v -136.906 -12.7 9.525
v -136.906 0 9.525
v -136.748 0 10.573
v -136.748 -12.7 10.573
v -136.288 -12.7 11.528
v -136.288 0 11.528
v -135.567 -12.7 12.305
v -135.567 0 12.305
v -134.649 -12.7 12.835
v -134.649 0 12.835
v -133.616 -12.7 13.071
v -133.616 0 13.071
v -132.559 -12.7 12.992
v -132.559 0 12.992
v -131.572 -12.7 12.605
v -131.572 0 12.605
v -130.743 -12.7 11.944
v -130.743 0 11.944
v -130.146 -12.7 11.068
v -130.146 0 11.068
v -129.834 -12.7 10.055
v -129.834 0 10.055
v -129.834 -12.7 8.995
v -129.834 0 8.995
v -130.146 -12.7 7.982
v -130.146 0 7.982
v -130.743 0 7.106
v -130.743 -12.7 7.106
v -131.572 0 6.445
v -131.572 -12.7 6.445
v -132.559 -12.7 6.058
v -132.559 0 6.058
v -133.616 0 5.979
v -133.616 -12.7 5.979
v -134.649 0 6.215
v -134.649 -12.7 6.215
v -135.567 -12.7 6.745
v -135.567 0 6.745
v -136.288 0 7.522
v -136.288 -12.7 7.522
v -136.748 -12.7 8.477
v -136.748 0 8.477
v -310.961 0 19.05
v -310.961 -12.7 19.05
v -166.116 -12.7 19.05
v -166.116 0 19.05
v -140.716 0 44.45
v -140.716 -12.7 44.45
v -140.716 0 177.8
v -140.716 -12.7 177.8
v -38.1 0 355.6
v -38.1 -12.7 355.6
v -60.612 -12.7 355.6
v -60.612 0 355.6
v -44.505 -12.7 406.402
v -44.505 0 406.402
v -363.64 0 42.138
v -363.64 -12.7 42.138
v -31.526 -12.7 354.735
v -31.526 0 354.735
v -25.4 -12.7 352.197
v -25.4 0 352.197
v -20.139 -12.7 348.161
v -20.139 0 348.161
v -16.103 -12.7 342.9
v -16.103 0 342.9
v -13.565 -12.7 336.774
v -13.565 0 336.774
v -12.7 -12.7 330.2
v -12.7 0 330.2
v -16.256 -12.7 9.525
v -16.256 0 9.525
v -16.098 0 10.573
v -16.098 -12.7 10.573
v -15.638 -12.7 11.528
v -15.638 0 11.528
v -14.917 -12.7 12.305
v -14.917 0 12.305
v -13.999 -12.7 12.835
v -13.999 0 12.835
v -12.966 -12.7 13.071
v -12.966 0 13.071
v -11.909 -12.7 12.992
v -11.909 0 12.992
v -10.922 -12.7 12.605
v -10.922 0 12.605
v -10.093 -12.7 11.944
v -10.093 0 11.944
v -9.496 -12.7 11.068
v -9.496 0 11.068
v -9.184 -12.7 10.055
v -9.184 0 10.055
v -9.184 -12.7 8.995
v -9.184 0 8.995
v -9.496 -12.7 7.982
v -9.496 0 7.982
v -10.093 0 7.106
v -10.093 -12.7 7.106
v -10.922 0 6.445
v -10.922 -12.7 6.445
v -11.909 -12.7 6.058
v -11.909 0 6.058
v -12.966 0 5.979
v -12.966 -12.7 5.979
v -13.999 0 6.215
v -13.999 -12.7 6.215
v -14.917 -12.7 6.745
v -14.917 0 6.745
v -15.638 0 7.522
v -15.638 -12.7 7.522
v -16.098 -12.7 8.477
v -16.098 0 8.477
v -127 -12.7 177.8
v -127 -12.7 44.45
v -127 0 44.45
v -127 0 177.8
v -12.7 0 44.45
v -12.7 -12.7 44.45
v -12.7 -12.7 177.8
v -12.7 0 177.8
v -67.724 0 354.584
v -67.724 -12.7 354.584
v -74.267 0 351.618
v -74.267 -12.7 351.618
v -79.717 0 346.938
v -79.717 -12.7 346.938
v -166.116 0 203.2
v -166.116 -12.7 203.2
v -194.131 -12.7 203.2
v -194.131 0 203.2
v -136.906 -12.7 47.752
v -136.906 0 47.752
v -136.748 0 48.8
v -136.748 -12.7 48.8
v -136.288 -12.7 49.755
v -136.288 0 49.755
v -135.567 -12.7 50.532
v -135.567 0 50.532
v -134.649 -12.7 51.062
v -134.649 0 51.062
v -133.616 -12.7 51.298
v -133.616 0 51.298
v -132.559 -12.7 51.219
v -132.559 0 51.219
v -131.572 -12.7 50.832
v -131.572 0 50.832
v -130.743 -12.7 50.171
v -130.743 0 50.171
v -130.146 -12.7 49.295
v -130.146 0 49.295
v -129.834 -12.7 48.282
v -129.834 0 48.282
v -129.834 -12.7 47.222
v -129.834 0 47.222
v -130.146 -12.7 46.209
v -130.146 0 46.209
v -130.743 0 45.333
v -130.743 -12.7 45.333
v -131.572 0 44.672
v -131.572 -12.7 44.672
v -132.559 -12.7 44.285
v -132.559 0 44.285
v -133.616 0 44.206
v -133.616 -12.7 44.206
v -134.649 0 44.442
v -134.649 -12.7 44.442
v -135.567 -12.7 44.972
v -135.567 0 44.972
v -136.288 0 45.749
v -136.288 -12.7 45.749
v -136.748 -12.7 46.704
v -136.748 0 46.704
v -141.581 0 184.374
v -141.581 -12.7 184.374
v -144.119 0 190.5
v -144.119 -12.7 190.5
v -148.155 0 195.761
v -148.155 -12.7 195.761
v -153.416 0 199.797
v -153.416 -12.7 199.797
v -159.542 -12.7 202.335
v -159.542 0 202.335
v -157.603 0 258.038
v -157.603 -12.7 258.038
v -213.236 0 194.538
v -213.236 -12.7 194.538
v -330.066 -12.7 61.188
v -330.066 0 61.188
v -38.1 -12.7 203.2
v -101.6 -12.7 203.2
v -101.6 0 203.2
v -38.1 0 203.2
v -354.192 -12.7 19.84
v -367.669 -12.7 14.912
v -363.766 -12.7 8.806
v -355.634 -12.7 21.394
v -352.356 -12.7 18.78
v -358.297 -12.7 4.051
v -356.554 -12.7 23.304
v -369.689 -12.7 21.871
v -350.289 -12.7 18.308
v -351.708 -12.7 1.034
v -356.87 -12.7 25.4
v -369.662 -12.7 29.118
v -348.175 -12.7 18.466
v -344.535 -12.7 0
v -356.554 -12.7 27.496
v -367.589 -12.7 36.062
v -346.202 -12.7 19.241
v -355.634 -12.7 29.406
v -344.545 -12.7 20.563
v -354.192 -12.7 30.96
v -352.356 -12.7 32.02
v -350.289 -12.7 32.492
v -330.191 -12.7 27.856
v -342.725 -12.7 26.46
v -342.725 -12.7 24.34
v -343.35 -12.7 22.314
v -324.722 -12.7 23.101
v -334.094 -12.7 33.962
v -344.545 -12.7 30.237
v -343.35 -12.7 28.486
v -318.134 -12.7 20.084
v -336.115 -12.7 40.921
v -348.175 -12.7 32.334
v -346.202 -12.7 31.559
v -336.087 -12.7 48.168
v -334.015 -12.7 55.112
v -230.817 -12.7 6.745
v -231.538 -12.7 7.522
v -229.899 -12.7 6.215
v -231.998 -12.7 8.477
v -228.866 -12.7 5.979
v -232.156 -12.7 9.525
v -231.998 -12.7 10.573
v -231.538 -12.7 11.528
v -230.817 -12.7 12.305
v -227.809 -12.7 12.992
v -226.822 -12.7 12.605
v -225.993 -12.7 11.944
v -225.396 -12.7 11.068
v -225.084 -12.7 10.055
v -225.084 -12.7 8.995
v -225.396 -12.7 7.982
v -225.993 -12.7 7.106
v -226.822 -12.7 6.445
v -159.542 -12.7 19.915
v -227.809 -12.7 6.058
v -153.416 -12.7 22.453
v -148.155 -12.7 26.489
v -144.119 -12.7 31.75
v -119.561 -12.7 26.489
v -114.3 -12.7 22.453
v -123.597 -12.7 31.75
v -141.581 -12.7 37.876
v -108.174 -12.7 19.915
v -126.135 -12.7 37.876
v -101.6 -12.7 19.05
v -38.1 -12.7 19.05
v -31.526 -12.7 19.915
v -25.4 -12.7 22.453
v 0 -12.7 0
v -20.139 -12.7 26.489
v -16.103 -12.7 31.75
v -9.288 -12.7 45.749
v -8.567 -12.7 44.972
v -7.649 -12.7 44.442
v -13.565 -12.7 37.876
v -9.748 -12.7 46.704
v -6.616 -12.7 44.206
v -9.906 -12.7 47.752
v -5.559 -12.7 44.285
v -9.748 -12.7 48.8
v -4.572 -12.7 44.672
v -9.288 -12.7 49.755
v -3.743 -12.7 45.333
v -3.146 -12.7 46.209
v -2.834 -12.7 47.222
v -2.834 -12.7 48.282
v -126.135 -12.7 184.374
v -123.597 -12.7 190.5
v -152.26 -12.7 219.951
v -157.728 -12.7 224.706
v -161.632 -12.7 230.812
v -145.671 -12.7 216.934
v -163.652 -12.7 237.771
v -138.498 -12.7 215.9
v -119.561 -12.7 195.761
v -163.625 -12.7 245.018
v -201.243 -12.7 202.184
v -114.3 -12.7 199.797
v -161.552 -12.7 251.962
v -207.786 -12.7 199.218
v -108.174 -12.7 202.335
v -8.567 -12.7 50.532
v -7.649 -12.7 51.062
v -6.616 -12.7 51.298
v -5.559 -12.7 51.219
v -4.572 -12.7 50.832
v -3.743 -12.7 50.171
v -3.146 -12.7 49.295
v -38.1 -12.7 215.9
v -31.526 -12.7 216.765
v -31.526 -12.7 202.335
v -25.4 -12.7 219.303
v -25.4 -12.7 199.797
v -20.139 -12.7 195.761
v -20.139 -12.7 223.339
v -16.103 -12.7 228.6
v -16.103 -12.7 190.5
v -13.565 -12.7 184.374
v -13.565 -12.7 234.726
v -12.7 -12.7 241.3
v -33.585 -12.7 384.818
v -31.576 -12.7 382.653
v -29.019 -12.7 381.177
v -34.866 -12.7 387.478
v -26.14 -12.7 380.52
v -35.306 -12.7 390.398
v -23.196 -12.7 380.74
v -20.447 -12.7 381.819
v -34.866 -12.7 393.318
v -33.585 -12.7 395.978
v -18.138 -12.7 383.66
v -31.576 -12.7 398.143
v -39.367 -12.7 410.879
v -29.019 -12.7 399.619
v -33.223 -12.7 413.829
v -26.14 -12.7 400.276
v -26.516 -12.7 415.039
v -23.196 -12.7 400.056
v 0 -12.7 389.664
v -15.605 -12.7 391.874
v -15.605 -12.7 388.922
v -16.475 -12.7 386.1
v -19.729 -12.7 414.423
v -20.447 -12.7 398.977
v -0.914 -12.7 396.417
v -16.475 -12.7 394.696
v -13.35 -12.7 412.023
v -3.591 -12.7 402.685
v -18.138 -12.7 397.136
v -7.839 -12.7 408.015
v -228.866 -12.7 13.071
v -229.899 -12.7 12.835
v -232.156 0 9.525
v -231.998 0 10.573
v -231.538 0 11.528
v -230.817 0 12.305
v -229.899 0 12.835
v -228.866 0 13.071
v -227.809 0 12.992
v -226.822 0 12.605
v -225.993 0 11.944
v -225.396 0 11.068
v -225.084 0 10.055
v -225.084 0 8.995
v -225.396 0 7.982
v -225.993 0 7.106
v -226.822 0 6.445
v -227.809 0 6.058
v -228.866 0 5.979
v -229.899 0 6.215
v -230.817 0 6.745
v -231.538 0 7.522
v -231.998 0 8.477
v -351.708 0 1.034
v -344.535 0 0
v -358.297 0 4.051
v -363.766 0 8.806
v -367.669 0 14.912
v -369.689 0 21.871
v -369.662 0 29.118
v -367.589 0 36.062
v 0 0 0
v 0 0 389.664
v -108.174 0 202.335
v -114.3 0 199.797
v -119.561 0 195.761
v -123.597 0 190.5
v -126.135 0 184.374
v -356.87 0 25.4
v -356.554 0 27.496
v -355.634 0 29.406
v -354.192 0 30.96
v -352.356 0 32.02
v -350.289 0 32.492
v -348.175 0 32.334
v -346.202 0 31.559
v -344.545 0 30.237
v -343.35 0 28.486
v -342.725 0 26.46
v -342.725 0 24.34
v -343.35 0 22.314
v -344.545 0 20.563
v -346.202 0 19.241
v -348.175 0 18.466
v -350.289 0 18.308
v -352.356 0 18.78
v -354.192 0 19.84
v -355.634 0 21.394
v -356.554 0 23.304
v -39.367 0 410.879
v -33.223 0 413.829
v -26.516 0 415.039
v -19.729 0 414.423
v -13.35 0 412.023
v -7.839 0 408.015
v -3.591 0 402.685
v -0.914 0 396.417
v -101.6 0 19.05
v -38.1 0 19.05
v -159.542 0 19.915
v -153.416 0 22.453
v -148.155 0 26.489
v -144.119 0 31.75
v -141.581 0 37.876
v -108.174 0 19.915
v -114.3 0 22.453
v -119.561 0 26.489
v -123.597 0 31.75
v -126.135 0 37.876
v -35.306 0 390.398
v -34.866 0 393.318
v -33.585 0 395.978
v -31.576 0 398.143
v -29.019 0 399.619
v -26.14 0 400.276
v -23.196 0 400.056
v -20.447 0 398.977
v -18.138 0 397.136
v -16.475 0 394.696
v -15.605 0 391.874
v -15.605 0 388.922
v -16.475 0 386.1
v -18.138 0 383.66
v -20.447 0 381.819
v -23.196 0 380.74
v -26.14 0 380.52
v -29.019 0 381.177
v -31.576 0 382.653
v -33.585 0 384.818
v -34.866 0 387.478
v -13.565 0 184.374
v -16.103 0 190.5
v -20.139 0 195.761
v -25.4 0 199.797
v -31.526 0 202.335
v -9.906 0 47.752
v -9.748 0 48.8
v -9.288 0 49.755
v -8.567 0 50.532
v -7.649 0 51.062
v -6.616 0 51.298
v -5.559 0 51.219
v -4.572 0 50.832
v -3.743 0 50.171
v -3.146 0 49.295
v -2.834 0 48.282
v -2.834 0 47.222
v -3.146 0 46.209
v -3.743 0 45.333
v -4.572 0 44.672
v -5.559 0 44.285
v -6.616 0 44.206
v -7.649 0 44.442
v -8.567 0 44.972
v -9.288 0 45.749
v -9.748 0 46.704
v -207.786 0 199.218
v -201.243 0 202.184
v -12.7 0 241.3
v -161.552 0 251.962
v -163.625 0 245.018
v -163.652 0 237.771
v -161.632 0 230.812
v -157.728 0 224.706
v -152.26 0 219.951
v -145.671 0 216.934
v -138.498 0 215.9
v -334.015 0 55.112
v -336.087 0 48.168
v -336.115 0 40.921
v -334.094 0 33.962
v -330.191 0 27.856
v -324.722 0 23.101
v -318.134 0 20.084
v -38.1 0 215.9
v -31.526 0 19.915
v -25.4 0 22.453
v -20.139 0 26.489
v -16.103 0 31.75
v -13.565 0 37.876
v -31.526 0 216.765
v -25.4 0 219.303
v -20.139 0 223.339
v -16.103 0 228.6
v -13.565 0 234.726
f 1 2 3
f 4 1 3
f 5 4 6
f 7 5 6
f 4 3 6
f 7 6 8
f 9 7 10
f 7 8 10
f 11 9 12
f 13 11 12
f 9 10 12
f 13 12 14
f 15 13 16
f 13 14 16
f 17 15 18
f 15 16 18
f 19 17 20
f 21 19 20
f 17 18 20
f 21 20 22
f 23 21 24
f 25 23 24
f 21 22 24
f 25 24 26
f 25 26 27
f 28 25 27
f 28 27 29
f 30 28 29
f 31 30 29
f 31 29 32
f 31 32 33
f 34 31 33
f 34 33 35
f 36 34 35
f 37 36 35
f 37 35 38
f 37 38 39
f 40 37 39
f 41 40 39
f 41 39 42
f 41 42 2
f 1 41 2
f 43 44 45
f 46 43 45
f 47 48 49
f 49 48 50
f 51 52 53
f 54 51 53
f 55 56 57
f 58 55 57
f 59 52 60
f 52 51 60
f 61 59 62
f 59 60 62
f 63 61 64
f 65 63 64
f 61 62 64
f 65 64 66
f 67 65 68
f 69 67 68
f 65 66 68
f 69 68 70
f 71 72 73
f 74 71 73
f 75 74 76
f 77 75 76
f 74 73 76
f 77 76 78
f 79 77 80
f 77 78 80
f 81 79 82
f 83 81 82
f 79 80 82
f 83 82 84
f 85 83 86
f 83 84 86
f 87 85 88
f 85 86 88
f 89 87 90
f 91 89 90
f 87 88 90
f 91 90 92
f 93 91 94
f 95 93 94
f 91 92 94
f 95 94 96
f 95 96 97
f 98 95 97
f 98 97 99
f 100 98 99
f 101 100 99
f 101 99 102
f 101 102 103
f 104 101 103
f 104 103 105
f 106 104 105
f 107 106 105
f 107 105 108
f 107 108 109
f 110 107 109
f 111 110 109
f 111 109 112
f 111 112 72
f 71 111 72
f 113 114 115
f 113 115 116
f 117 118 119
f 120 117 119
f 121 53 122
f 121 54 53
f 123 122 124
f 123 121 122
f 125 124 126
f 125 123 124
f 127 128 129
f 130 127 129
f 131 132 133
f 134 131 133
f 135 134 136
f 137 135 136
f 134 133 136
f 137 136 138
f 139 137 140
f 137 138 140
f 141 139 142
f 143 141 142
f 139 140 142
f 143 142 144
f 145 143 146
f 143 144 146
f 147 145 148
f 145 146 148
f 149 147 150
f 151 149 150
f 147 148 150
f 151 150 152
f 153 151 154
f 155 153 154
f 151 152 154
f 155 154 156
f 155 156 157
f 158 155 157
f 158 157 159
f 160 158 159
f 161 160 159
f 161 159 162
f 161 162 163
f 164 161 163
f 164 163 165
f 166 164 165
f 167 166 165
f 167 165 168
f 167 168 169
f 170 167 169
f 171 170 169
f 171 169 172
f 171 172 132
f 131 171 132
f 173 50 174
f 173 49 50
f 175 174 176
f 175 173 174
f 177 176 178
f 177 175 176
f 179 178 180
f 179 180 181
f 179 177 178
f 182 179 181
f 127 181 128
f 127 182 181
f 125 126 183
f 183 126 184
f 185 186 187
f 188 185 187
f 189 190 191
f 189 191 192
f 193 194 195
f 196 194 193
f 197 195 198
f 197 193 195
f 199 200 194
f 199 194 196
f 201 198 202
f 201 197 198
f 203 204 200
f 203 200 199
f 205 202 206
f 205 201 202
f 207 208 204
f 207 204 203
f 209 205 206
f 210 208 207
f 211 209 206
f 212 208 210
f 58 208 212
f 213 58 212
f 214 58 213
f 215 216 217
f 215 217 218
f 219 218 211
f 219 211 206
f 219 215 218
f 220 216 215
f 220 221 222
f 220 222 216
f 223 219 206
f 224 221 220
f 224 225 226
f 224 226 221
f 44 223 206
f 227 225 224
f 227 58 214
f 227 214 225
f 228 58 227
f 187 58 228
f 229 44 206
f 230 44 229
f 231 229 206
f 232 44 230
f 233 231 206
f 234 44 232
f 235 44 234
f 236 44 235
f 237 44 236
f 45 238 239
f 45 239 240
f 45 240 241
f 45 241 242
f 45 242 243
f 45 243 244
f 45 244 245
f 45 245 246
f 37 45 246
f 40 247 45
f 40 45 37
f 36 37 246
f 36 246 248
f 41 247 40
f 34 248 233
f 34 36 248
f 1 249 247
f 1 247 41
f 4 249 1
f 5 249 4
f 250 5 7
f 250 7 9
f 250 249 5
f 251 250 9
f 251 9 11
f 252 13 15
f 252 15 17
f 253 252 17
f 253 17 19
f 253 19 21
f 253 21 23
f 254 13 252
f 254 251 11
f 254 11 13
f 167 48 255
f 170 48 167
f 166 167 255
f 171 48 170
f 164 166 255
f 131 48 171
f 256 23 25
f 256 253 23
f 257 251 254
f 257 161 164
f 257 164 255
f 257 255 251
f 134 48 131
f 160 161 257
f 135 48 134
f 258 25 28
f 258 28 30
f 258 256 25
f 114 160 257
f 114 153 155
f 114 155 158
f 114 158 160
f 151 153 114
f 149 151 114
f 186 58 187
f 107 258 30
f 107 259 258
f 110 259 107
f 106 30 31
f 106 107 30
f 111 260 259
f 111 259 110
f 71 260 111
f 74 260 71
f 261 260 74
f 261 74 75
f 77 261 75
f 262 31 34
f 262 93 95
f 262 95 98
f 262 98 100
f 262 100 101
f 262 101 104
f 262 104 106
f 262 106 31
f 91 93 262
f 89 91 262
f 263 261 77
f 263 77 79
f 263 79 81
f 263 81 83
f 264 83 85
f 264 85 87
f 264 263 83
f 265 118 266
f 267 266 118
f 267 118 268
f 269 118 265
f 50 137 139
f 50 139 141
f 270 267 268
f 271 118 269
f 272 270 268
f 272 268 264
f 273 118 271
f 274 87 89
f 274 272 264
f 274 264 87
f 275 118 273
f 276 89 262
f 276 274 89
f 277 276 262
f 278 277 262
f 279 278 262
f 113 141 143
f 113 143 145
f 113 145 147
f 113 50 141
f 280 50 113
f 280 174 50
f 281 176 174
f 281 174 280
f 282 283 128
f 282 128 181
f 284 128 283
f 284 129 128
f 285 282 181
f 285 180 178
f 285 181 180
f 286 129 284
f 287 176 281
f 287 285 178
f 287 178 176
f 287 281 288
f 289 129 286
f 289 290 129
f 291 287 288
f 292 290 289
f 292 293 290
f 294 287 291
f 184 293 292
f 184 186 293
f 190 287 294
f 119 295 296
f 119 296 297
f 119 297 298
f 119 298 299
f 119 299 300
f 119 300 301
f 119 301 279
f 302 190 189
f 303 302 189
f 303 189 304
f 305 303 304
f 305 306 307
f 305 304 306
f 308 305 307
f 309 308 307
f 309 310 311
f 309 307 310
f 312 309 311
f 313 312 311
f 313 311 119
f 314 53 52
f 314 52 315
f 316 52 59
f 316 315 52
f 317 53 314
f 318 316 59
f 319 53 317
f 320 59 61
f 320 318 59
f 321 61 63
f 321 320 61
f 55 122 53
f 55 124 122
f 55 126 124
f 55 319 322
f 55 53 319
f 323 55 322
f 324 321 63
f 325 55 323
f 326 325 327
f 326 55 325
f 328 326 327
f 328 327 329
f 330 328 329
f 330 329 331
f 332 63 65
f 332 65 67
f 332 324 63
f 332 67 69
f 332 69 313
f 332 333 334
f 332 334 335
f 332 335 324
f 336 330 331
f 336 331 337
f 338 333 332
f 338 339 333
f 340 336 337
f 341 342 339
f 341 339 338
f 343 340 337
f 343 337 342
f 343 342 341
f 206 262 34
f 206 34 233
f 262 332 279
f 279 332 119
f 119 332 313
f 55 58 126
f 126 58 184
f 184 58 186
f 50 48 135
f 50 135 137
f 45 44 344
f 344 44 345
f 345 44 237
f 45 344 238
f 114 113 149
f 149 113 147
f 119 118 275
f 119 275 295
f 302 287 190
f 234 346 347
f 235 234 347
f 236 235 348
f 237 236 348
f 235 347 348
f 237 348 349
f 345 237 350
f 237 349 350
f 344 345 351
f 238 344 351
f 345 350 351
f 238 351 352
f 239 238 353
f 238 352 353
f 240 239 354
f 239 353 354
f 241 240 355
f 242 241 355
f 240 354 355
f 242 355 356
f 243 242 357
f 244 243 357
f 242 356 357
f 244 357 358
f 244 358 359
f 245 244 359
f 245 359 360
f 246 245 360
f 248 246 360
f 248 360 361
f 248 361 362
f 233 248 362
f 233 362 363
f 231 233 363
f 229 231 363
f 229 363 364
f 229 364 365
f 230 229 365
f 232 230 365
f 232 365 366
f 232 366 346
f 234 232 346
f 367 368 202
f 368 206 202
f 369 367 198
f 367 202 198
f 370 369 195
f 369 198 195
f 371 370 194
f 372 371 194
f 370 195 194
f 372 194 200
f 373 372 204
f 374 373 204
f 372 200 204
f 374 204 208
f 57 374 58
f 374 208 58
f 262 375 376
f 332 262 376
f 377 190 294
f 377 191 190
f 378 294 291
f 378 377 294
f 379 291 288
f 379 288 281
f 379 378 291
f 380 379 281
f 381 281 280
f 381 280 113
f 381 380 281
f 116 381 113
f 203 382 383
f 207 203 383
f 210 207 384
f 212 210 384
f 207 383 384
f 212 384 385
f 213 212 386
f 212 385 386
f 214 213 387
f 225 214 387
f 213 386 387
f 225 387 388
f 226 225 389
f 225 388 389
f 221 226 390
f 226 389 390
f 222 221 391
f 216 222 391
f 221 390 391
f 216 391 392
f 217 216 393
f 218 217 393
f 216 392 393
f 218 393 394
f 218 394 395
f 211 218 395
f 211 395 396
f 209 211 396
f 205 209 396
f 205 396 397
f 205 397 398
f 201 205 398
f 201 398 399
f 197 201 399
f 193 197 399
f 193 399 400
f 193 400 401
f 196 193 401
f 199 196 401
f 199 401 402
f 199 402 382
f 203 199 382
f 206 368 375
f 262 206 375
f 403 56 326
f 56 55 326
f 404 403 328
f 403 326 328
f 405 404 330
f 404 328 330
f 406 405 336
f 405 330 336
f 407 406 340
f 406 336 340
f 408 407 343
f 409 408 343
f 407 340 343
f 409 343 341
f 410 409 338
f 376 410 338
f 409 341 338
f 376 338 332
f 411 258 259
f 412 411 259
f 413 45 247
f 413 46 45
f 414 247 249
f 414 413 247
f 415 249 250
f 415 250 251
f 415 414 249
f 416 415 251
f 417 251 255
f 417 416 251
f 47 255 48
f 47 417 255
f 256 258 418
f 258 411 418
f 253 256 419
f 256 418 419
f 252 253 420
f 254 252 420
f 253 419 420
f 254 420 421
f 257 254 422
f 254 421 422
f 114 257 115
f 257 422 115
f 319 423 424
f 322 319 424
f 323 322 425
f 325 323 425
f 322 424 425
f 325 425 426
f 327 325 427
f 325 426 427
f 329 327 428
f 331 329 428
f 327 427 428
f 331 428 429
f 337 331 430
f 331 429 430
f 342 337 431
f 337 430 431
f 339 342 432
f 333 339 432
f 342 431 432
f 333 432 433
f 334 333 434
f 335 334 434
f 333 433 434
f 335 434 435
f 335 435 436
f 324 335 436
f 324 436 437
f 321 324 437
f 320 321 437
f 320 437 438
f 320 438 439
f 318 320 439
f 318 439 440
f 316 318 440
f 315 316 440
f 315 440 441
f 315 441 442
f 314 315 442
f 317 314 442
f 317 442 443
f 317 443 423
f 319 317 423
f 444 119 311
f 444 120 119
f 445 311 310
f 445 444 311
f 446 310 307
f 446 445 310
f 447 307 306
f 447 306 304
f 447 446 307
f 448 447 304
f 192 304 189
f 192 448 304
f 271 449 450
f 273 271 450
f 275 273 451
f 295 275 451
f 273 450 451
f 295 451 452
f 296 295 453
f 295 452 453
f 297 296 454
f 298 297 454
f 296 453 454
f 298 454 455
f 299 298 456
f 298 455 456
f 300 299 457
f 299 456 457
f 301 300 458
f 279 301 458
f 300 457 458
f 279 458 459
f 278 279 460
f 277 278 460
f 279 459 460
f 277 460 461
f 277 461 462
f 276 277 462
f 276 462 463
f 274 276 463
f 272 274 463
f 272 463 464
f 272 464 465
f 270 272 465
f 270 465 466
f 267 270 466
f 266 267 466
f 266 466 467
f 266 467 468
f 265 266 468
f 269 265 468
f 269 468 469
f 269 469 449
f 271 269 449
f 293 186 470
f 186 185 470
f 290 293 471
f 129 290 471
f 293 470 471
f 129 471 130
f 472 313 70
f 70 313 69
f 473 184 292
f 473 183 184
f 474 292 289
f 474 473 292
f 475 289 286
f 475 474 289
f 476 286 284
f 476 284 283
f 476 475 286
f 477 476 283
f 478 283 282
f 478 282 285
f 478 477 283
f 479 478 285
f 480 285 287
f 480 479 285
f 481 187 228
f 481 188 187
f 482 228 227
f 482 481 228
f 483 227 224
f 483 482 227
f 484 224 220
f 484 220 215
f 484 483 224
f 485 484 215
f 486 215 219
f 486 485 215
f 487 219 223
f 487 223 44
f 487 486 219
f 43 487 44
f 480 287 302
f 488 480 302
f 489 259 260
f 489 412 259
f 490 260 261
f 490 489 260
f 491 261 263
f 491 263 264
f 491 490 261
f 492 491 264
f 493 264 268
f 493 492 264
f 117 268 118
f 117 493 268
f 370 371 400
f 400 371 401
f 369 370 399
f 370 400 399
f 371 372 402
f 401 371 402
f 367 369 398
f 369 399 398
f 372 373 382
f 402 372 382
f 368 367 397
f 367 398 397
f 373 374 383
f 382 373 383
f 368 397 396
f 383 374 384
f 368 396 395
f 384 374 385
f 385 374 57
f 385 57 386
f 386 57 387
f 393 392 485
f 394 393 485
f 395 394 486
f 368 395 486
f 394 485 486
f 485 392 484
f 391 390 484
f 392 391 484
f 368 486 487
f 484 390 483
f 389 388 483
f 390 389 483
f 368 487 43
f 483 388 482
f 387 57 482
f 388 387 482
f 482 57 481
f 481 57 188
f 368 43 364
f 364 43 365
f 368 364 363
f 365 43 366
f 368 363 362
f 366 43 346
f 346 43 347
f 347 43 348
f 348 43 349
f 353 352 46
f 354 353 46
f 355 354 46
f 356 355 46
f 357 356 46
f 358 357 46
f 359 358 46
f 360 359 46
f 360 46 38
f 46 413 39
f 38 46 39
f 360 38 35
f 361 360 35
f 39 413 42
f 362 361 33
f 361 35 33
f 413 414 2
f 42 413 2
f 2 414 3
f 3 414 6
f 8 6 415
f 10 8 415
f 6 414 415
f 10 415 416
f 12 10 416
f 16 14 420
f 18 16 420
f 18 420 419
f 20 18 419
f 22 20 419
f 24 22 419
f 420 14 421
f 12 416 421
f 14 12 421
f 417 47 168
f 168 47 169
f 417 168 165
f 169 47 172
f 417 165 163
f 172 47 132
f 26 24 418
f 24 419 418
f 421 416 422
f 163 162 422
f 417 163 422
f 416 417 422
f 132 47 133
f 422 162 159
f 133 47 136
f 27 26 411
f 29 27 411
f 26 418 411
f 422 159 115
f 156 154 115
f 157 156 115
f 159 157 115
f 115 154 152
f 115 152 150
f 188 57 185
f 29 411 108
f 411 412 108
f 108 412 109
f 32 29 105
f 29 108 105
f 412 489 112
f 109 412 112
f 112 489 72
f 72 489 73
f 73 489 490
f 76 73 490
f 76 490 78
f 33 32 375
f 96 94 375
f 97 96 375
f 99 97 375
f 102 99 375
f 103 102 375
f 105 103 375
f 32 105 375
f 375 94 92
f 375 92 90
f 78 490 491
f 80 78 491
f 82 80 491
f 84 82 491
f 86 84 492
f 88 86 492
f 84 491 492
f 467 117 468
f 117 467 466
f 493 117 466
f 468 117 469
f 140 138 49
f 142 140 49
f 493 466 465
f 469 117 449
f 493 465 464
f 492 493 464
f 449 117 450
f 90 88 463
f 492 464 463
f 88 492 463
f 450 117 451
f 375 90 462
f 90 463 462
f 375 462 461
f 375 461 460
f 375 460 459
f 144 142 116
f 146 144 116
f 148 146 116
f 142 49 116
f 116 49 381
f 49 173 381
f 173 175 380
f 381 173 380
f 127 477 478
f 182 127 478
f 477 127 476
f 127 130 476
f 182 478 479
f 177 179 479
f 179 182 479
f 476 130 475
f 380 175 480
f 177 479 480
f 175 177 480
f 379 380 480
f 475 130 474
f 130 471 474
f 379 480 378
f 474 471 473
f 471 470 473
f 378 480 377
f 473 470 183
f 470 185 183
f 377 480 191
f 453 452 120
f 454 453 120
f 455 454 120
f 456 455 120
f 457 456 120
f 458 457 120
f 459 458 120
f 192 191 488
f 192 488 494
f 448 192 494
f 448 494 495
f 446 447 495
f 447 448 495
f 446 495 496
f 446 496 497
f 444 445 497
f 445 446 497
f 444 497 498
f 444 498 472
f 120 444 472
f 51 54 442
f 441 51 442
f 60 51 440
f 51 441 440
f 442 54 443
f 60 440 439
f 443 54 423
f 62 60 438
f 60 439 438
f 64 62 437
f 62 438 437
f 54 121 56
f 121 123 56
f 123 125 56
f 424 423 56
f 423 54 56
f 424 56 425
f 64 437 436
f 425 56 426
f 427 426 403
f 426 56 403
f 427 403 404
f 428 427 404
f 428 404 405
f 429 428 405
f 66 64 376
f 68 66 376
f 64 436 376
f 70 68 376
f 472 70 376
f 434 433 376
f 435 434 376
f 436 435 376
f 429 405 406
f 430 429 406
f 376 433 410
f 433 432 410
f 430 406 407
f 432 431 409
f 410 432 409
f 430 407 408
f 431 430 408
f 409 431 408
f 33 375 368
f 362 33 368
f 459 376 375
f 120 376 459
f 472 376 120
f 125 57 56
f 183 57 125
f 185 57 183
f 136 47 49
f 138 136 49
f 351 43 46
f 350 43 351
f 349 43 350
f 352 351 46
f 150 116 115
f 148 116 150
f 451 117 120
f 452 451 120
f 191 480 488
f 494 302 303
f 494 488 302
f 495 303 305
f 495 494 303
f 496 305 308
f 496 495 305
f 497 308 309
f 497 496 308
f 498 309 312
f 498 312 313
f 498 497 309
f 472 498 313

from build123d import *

# Parameters (mm, degrees)
F1_DEPTH = 12.7
F2_W     = 114.3
F2_H     = 184.15
F3_DEPTH = 12.7
F4_R     = 25.4
F5_D     = 14.224
F6_D     = 19.812
F7_D     = 7.112
F8_R     = 25.4


with BuildPart() as f1:
    # F0 (on Front) → F1 (new body)
    with BuildSketch(Plane.XZ):
        Polygon((-400.558, 0), (0, 0), (0, 457.2), align=None)
    extrude(amount=F1_DEPTH)

    # F2 (on face) → F3 (cut, through all)
    with BuildSketch(Plane.XZ.offset(12.7)):
        with Locations((-69.85, 111.125)):
            Rectangle(F2_W, F2_H)
        Polygon((-205.64757, 203.2), (-366.983431, 19.05), (-140.716, 19.05), (-140.716, 203.2), align=None)
        Polygon((-12.7, 355.6), (-72.128237, 355.6), (-194.520959, 215.9), (-12.7, 215.9), align=None)
    extrude(amount=-F3_DEPTH, mode=Mode.SUBTRACT)

    # F4
    f4_edges = [f1.edges().sort_by_distance(p)[0] for p in [
        (-205.64757, -6.35, 203.2),
        (-140.716, -6.35, 203.2),
        (-127, -6.35, 203.2),
        (-12.7, -6.35, 203.2),
        (-12.7, -6.35, 355.6),
        (-72.128237, -6.35, 355.6),
        (-366.983431, -6.35, 19.05),
        (-140.716, -6.35, 19.05),
        (-127, -6.35, 19.05),
        (-12.7, -6.35, 19.05),
        (-194.520959, -6.35, 215.9),
        (-12.7, -6.35, 215.9),
    ]]
    fillet(f4_edges, radius=F4_R)

    # F5 (through all)
    with Locations(Plane.XZ.offset(12.7)):
        with Locations((-349.758, 25.4)):
            Hole(F5_D / 2)

    # F6 (through all)
    with Locations(Plane.XZ.offset(12.7)):
        with Locations((-25.4, 390.398)):
            Hole(F6_D / 2)

    # F7 (through all)
    with Locations(Plane.XZ.offset(12.7)):
        with Locations((-228.6, 9.525), (-133.35, 9.525), (-133.35, 47.752), (-6.35, 47.752), (-12.7, 9.525)):
            Hole(F7_D / 2)

    # F8
    f8_edges = [f1.edges().sort_by_distance(p)[0] for p in [
        (0, -6.35, 457.2),
        (-400.558, -6.35, 0),
    ]]
    fillet(f8_edges, radius=F8_R)


solid = f1.part
